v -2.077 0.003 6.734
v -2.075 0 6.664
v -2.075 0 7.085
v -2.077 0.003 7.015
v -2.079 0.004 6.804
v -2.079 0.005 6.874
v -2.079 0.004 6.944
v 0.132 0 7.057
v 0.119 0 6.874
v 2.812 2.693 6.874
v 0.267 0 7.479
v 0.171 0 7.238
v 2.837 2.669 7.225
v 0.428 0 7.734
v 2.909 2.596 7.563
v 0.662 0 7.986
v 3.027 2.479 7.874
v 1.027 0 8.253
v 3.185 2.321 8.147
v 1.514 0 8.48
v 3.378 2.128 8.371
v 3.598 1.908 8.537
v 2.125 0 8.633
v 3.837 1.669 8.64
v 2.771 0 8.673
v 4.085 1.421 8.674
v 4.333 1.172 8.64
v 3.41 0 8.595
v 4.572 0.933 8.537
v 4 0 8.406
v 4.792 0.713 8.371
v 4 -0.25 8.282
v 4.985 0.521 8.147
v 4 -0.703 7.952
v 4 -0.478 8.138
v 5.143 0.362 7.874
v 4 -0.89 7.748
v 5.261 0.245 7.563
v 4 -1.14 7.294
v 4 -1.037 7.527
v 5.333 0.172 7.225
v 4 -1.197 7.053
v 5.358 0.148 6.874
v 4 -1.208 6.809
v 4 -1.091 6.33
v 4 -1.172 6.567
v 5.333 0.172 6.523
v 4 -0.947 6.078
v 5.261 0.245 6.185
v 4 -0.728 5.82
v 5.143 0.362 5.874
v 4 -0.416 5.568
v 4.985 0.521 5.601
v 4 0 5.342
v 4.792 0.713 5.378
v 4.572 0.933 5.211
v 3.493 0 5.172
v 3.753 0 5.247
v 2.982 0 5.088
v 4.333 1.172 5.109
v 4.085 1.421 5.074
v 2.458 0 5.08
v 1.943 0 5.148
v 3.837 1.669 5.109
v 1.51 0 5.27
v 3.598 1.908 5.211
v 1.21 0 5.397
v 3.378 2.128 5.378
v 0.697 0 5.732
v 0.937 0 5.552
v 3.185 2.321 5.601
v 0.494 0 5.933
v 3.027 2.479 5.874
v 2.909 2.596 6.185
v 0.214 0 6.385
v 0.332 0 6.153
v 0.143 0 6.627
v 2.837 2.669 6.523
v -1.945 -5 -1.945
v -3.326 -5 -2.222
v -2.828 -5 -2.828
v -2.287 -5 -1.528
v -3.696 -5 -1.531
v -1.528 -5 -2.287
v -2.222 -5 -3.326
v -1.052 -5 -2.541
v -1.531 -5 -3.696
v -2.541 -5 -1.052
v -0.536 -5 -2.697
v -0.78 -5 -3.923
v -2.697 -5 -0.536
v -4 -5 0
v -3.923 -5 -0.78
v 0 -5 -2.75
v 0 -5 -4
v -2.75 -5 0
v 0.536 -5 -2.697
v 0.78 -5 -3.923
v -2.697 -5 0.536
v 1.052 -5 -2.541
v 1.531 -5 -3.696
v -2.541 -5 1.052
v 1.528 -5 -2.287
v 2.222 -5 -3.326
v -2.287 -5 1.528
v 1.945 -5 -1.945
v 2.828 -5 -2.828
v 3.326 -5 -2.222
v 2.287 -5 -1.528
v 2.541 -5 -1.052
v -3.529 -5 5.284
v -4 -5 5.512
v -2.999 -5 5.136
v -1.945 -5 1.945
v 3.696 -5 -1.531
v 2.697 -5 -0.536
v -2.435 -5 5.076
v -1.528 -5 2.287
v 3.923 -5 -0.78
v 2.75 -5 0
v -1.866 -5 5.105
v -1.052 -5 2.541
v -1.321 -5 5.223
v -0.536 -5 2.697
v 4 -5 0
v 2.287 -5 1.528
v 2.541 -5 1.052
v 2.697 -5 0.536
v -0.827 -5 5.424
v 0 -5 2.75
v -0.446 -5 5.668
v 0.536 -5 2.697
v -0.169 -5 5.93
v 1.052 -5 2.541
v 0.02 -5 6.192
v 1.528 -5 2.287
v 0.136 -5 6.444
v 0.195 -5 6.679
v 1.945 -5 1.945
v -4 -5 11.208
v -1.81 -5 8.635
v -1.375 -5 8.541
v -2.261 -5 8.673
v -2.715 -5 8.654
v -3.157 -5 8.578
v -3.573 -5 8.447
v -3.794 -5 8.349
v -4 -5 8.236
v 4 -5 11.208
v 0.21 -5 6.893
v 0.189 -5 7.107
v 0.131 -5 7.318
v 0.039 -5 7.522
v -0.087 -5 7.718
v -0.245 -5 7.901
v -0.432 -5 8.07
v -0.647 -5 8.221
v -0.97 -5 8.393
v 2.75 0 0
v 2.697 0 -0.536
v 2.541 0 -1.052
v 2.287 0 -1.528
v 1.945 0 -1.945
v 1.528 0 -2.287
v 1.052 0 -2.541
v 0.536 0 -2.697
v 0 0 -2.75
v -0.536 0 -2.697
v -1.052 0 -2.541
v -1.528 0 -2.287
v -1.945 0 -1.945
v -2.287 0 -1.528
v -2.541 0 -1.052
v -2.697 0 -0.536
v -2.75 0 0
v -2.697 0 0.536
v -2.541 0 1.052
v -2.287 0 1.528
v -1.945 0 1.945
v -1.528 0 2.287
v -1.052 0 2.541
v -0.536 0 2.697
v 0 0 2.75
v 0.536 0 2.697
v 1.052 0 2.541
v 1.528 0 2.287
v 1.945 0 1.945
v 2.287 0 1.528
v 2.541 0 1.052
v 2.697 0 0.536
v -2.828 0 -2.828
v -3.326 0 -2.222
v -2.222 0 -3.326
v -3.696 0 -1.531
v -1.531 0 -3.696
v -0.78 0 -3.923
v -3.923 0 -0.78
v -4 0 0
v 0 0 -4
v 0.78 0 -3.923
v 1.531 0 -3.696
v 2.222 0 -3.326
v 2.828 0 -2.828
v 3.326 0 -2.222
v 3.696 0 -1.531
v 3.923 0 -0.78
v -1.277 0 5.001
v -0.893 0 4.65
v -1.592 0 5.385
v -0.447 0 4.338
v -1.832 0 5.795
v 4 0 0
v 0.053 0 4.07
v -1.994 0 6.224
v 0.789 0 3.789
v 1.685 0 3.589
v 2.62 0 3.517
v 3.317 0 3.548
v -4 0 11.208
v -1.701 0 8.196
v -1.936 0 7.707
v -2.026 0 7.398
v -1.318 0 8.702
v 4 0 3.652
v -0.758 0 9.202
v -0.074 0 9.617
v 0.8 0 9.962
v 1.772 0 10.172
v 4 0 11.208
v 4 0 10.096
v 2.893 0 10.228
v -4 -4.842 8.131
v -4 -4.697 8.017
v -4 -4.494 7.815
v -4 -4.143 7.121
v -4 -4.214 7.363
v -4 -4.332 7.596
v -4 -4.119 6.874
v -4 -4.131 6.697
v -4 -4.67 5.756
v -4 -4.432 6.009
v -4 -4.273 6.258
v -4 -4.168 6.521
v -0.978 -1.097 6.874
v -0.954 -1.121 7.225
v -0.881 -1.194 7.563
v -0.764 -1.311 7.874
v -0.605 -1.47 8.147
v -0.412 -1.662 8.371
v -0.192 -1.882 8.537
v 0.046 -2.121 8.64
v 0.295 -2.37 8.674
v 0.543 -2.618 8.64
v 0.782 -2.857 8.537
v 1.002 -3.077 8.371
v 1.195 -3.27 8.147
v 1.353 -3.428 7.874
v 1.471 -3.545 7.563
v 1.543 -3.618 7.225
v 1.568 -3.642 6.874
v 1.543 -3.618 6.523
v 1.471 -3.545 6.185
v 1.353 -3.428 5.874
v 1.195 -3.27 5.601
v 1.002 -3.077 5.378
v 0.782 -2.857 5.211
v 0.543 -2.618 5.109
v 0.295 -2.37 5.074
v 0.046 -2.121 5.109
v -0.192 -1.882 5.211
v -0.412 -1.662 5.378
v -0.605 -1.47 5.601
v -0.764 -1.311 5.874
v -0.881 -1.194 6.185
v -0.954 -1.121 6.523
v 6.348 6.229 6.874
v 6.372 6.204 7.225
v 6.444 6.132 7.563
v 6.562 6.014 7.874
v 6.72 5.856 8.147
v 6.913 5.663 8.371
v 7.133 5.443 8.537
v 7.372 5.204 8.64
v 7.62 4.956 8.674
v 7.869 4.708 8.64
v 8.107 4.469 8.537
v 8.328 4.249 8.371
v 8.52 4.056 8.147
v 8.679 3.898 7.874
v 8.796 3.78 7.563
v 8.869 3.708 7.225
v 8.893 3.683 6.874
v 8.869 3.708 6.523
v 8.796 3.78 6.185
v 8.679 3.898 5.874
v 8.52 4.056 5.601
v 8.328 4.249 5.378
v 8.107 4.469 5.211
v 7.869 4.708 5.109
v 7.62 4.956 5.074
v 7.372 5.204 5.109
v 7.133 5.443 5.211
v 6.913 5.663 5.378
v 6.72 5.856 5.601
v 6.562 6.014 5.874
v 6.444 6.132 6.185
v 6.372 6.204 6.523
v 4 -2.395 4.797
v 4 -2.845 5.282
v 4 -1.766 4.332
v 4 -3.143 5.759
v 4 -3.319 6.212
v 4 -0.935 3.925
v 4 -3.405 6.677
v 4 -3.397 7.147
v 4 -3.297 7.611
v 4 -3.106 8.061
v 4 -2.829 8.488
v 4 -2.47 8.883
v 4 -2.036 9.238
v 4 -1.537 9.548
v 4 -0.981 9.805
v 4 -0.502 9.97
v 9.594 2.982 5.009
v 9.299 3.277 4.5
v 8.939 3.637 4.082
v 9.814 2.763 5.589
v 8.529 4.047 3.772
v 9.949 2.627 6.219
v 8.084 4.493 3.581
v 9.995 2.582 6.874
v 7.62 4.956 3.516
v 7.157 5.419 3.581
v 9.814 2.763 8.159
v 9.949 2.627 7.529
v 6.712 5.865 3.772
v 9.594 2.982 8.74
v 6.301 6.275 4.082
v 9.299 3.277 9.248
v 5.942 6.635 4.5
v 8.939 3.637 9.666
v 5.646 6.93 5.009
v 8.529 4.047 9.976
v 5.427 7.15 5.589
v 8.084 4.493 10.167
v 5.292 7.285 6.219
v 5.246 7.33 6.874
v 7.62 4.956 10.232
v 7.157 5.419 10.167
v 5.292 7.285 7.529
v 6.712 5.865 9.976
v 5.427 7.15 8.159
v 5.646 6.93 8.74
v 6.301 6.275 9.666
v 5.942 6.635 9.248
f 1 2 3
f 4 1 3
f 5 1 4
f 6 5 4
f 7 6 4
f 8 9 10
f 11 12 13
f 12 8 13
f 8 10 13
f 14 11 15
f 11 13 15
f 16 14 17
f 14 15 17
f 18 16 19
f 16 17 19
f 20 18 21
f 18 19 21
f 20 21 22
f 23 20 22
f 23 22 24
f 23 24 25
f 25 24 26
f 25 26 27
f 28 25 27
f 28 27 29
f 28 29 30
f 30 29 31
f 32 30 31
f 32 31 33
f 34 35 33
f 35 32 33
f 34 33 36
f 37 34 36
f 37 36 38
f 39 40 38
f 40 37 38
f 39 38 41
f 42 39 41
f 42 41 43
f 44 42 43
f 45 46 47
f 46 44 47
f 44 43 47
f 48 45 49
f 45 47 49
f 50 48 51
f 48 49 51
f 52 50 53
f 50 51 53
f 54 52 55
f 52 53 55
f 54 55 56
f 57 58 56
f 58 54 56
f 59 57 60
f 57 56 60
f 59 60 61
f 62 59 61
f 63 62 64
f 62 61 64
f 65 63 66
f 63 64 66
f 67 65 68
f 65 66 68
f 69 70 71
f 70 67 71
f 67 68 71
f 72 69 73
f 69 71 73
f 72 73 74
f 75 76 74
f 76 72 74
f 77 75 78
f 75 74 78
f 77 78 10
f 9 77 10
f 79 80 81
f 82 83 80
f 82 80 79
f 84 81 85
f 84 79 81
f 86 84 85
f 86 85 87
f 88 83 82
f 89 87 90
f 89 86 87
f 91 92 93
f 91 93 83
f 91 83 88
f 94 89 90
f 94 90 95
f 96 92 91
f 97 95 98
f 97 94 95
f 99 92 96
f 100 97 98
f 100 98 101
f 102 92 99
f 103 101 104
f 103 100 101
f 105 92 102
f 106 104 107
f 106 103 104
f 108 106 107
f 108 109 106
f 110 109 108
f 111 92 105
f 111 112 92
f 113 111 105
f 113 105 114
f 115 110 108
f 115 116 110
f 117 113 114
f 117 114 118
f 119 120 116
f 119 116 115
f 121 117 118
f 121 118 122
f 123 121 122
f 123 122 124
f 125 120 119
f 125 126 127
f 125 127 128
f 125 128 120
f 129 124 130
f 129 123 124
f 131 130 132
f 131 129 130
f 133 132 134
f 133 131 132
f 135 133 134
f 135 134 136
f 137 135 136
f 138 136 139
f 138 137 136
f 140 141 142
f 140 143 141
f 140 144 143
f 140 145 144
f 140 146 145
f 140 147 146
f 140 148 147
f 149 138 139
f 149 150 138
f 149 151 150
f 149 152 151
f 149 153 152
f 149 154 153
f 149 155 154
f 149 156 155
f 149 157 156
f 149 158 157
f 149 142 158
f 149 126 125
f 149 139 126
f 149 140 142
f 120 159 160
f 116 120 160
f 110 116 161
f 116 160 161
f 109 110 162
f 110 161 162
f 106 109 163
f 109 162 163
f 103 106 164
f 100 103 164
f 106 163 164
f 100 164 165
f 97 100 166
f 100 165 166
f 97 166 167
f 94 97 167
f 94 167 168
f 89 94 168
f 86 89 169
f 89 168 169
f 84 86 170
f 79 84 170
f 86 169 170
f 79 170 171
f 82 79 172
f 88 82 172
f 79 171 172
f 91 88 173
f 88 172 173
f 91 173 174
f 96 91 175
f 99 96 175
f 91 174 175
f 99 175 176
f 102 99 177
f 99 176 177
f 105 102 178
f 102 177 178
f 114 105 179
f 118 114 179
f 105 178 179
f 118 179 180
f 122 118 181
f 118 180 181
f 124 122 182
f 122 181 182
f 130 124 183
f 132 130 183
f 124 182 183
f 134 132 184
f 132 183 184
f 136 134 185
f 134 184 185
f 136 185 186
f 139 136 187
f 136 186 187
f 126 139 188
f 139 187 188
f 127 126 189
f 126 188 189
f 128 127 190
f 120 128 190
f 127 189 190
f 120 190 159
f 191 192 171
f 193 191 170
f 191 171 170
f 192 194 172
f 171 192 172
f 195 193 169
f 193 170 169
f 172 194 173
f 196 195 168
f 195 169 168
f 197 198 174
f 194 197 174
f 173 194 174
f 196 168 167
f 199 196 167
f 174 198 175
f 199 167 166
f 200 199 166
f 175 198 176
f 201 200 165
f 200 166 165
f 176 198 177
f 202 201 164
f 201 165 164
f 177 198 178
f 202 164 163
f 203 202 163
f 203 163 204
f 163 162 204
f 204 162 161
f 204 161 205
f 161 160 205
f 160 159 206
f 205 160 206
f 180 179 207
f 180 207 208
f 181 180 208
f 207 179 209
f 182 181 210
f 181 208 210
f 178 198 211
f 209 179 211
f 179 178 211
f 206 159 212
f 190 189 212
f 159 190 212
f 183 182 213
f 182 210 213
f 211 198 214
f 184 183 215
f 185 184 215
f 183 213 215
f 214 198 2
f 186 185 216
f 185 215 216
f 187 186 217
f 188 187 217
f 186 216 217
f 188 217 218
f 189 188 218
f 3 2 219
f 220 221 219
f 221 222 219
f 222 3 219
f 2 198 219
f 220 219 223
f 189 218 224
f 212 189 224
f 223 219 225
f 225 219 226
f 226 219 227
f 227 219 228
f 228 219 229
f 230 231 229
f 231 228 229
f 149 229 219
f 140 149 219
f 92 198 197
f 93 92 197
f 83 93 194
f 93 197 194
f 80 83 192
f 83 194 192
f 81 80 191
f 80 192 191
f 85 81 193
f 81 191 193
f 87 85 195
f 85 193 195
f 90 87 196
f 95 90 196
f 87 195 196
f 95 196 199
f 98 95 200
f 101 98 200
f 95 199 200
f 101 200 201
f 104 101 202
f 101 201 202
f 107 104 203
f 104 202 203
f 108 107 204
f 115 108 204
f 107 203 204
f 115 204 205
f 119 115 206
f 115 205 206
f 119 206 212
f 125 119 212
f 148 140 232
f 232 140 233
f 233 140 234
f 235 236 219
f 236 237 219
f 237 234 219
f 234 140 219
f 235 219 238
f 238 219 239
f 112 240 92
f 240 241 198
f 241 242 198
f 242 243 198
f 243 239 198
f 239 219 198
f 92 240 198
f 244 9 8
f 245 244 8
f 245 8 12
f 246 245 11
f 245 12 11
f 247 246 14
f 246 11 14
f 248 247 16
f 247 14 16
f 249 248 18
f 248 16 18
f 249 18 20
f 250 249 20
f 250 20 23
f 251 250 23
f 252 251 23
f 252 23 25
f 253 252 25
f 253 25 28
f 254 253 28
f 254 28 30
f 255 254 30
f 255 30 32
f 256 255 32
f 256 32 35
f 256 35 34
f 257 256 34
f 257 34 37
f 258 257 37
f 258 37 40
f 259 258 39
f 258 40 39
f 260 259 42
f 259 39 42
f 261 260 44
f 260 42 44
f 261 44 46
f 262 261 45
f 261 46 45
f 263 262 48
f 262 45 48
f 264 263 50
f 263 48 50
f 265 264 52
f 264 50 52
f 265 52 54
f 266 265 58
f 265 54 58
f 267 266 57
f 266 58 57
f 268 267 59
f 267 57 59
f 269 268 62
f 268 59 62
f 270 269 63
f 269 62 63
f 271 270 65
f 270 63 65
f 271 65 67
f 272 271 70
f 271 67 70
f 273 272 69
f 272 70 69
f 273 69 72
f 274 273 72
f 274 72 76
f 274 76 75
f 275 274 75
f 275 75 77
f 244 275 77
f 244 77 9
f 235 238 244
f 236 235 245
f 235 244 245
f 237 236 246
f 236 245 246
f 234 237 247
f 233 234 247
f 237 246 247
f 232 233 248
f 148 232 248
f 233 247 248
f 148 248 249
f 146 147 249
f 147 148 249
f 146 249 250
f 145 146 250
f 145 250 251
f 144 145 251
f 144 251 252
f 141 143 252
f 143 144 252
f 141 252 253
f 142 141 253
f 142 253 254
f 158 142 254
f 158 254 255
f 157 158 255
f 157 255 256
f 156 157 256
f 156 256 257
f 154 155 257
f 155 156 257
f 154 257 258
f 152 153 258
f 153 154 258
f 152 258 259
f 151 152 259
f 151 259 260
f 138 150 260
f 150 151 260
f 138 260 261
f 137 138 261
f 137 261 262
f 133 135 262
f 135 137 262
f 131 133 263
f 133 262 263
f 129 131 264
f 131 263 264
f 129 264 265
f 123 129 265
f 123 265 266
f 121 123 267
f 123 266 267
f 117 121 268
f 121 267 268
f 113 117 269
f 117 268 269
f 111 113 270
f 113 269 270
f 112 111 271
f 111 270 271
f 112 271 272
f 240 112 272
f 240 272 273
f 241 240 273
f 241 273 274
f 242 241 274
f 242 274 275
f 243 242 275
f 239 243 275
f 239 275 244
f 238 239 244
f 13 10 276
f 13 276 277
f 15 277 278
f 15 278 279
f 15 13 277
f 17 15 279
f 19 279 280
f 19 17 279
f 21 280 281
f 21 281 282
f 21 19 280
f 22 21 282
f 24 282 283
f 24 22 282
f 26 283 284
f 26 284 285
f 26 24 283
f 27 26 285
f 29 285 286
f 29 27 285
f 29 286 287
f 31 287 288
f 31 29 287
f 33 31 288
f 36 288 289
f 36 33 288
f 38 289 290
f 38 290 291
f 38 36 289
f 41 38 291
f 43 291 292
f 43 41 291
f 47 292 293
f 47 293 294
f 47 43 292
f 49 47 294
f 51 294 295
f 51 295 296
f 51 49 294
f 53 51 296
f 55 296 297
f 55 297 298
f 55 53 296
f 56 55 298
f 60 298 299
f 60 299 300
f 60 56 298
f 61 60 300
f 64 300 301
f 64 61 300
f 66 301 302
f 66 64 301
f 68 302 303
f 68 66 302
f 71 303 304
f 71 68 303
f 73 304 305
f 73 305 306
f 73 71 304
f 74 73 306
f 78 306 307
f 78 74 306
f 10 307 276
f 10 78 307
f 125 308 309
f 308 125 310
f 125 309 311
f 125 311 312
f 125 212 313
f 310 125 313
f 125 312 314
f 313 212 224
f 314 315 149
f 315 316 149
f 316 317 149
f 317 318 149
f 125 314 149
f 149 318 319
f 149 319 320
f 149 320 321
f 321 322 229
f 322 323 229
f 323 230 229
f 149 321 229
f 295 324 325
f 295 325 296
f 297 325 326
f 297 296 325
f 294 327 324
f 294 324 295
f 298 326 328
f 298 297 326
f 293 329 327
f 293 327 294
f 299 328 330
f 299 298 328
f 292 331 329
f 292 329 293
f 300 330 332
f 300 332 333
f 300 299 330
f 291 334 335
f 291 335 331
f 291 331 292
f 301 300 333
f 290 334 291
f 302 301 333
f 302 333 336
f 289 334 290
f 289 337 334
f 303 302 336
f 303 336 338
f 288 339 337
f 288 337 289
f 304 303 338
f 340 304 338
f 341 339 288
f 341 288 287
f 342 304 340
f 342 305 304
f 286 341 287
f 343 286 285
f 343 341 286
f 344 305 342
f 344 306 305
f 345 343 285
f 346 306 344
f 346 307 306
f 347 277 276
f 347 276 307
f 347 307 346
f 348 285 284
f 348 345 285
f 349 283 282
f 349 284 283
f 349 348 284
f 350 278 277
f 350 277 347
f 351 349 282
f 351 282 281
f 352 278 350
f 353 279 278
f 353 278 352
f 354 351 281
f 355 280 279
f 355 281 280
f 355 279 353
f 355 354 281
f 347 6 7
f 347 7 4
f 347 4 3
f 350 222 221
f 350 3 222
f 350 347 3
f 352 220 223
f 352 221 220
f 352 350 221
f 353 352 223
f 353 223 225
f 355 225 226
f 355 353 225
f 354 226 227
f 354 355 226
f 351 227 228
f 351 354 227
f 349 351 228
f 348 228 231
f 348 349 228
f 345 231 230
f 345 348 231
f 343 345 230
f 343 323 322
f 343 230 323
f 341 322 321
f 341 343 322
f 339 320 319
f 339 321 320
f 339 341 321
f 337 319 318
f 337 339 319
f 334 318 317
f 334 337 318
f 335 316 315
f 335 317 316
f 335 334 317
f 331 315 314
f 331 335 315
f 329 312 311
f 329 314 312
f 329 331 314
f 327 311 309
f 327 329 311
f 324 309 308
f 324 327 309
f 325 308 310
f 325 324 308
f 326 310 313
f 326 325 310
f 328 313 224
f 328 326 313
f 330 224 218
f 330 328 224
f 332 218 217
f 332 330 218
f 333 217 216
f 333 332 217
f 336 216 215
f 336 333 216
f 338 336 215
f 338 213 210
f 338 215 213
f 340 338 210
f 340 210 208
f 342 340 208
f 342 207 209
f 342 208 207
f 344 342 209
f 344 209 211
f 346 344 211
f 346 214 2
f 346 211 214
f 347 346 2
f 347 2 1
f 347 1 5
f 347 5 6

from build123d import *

# Parameters (mm, degrees)
F1_DEPTH      = 5
F4_R          = 1.8
F5_DEPTH      = 25
F4_R_2        = 3.3576804347
F6_DEPTH      = 5
F6_DEPTH_BACK = 5.36


with BuildPart() as f1:
    # F0 (on Front) → F1 (new body)
    with BuildSketch(Plane.XZ):
        with BuildLine():
            ThreePointArc((-4, 0), (0, 4), (4, 0))
            Line((4, 0), (4, 11.2083284184))
            Line((4, 11.2083284184), (-4, 11.2083284184))
            Line((-4, 11.2083284184), (-4, 0))
        make_face()
        with BuildLine():
            Line((4, 0), (2.75, 0))
            ThreePointArc((2.75, 0), (0, -2.75), (-2.75, 0))
            Line((-2.75, 0), (-4, 0))
            ThreePointArc((-4, 0), (0, -4), (4, 0))
        make_face()
        with BuildLine():
            ThreePointArc((-2.75, 0), (0, 2.75), (2.75, 0))
            Line((2.75, 0), (4, 0))
            ThreePointArc((4, 0), (0, 4), (-4, 0))
            Line((-4, 0), (-2.75, 0))
        make_face()
    extrude(amount=F1_DEPTH)

    # F4 (on face) → F5 (cut)
    with BuildSketch(Plane(origin=(2.7526911935, 2.7526911935, 0), x_dir=(-0.7071067812, 0.7071067812, 0), z_dir=(0.7071067812, 0.7071067812, 0))):
        with Locations((-1.8839619588, 6.8741668947)):
            Circle(F4_R)
    extrude(amount=-F5_DEPTH, mode=Mode.SUBTRACT)

    # F4 (on face) → F6 (join, two sides)
    with BuildSketch(Plane(origin=(2.7526911935, 2.7526911935, 0), x_dir=(-0.7071067812, 0.7071067812, 0), z_dir=(0.7071067812, 0.7071067812, 0))) as f6_sk:
        with Locations((-1.8839619588, 6.8741668947)):
            Circle(F4_R_2)
        with Locations((-1.8839619588, 6.8741668947)):
            Circle(F4_R, mode=Mode.SUBTRACT)
    extrude(amount=F6_DEPTH)
    extrude(f6_sk.sketch, amount=-F6_DEPTH_BACK)


solid = f1.part
